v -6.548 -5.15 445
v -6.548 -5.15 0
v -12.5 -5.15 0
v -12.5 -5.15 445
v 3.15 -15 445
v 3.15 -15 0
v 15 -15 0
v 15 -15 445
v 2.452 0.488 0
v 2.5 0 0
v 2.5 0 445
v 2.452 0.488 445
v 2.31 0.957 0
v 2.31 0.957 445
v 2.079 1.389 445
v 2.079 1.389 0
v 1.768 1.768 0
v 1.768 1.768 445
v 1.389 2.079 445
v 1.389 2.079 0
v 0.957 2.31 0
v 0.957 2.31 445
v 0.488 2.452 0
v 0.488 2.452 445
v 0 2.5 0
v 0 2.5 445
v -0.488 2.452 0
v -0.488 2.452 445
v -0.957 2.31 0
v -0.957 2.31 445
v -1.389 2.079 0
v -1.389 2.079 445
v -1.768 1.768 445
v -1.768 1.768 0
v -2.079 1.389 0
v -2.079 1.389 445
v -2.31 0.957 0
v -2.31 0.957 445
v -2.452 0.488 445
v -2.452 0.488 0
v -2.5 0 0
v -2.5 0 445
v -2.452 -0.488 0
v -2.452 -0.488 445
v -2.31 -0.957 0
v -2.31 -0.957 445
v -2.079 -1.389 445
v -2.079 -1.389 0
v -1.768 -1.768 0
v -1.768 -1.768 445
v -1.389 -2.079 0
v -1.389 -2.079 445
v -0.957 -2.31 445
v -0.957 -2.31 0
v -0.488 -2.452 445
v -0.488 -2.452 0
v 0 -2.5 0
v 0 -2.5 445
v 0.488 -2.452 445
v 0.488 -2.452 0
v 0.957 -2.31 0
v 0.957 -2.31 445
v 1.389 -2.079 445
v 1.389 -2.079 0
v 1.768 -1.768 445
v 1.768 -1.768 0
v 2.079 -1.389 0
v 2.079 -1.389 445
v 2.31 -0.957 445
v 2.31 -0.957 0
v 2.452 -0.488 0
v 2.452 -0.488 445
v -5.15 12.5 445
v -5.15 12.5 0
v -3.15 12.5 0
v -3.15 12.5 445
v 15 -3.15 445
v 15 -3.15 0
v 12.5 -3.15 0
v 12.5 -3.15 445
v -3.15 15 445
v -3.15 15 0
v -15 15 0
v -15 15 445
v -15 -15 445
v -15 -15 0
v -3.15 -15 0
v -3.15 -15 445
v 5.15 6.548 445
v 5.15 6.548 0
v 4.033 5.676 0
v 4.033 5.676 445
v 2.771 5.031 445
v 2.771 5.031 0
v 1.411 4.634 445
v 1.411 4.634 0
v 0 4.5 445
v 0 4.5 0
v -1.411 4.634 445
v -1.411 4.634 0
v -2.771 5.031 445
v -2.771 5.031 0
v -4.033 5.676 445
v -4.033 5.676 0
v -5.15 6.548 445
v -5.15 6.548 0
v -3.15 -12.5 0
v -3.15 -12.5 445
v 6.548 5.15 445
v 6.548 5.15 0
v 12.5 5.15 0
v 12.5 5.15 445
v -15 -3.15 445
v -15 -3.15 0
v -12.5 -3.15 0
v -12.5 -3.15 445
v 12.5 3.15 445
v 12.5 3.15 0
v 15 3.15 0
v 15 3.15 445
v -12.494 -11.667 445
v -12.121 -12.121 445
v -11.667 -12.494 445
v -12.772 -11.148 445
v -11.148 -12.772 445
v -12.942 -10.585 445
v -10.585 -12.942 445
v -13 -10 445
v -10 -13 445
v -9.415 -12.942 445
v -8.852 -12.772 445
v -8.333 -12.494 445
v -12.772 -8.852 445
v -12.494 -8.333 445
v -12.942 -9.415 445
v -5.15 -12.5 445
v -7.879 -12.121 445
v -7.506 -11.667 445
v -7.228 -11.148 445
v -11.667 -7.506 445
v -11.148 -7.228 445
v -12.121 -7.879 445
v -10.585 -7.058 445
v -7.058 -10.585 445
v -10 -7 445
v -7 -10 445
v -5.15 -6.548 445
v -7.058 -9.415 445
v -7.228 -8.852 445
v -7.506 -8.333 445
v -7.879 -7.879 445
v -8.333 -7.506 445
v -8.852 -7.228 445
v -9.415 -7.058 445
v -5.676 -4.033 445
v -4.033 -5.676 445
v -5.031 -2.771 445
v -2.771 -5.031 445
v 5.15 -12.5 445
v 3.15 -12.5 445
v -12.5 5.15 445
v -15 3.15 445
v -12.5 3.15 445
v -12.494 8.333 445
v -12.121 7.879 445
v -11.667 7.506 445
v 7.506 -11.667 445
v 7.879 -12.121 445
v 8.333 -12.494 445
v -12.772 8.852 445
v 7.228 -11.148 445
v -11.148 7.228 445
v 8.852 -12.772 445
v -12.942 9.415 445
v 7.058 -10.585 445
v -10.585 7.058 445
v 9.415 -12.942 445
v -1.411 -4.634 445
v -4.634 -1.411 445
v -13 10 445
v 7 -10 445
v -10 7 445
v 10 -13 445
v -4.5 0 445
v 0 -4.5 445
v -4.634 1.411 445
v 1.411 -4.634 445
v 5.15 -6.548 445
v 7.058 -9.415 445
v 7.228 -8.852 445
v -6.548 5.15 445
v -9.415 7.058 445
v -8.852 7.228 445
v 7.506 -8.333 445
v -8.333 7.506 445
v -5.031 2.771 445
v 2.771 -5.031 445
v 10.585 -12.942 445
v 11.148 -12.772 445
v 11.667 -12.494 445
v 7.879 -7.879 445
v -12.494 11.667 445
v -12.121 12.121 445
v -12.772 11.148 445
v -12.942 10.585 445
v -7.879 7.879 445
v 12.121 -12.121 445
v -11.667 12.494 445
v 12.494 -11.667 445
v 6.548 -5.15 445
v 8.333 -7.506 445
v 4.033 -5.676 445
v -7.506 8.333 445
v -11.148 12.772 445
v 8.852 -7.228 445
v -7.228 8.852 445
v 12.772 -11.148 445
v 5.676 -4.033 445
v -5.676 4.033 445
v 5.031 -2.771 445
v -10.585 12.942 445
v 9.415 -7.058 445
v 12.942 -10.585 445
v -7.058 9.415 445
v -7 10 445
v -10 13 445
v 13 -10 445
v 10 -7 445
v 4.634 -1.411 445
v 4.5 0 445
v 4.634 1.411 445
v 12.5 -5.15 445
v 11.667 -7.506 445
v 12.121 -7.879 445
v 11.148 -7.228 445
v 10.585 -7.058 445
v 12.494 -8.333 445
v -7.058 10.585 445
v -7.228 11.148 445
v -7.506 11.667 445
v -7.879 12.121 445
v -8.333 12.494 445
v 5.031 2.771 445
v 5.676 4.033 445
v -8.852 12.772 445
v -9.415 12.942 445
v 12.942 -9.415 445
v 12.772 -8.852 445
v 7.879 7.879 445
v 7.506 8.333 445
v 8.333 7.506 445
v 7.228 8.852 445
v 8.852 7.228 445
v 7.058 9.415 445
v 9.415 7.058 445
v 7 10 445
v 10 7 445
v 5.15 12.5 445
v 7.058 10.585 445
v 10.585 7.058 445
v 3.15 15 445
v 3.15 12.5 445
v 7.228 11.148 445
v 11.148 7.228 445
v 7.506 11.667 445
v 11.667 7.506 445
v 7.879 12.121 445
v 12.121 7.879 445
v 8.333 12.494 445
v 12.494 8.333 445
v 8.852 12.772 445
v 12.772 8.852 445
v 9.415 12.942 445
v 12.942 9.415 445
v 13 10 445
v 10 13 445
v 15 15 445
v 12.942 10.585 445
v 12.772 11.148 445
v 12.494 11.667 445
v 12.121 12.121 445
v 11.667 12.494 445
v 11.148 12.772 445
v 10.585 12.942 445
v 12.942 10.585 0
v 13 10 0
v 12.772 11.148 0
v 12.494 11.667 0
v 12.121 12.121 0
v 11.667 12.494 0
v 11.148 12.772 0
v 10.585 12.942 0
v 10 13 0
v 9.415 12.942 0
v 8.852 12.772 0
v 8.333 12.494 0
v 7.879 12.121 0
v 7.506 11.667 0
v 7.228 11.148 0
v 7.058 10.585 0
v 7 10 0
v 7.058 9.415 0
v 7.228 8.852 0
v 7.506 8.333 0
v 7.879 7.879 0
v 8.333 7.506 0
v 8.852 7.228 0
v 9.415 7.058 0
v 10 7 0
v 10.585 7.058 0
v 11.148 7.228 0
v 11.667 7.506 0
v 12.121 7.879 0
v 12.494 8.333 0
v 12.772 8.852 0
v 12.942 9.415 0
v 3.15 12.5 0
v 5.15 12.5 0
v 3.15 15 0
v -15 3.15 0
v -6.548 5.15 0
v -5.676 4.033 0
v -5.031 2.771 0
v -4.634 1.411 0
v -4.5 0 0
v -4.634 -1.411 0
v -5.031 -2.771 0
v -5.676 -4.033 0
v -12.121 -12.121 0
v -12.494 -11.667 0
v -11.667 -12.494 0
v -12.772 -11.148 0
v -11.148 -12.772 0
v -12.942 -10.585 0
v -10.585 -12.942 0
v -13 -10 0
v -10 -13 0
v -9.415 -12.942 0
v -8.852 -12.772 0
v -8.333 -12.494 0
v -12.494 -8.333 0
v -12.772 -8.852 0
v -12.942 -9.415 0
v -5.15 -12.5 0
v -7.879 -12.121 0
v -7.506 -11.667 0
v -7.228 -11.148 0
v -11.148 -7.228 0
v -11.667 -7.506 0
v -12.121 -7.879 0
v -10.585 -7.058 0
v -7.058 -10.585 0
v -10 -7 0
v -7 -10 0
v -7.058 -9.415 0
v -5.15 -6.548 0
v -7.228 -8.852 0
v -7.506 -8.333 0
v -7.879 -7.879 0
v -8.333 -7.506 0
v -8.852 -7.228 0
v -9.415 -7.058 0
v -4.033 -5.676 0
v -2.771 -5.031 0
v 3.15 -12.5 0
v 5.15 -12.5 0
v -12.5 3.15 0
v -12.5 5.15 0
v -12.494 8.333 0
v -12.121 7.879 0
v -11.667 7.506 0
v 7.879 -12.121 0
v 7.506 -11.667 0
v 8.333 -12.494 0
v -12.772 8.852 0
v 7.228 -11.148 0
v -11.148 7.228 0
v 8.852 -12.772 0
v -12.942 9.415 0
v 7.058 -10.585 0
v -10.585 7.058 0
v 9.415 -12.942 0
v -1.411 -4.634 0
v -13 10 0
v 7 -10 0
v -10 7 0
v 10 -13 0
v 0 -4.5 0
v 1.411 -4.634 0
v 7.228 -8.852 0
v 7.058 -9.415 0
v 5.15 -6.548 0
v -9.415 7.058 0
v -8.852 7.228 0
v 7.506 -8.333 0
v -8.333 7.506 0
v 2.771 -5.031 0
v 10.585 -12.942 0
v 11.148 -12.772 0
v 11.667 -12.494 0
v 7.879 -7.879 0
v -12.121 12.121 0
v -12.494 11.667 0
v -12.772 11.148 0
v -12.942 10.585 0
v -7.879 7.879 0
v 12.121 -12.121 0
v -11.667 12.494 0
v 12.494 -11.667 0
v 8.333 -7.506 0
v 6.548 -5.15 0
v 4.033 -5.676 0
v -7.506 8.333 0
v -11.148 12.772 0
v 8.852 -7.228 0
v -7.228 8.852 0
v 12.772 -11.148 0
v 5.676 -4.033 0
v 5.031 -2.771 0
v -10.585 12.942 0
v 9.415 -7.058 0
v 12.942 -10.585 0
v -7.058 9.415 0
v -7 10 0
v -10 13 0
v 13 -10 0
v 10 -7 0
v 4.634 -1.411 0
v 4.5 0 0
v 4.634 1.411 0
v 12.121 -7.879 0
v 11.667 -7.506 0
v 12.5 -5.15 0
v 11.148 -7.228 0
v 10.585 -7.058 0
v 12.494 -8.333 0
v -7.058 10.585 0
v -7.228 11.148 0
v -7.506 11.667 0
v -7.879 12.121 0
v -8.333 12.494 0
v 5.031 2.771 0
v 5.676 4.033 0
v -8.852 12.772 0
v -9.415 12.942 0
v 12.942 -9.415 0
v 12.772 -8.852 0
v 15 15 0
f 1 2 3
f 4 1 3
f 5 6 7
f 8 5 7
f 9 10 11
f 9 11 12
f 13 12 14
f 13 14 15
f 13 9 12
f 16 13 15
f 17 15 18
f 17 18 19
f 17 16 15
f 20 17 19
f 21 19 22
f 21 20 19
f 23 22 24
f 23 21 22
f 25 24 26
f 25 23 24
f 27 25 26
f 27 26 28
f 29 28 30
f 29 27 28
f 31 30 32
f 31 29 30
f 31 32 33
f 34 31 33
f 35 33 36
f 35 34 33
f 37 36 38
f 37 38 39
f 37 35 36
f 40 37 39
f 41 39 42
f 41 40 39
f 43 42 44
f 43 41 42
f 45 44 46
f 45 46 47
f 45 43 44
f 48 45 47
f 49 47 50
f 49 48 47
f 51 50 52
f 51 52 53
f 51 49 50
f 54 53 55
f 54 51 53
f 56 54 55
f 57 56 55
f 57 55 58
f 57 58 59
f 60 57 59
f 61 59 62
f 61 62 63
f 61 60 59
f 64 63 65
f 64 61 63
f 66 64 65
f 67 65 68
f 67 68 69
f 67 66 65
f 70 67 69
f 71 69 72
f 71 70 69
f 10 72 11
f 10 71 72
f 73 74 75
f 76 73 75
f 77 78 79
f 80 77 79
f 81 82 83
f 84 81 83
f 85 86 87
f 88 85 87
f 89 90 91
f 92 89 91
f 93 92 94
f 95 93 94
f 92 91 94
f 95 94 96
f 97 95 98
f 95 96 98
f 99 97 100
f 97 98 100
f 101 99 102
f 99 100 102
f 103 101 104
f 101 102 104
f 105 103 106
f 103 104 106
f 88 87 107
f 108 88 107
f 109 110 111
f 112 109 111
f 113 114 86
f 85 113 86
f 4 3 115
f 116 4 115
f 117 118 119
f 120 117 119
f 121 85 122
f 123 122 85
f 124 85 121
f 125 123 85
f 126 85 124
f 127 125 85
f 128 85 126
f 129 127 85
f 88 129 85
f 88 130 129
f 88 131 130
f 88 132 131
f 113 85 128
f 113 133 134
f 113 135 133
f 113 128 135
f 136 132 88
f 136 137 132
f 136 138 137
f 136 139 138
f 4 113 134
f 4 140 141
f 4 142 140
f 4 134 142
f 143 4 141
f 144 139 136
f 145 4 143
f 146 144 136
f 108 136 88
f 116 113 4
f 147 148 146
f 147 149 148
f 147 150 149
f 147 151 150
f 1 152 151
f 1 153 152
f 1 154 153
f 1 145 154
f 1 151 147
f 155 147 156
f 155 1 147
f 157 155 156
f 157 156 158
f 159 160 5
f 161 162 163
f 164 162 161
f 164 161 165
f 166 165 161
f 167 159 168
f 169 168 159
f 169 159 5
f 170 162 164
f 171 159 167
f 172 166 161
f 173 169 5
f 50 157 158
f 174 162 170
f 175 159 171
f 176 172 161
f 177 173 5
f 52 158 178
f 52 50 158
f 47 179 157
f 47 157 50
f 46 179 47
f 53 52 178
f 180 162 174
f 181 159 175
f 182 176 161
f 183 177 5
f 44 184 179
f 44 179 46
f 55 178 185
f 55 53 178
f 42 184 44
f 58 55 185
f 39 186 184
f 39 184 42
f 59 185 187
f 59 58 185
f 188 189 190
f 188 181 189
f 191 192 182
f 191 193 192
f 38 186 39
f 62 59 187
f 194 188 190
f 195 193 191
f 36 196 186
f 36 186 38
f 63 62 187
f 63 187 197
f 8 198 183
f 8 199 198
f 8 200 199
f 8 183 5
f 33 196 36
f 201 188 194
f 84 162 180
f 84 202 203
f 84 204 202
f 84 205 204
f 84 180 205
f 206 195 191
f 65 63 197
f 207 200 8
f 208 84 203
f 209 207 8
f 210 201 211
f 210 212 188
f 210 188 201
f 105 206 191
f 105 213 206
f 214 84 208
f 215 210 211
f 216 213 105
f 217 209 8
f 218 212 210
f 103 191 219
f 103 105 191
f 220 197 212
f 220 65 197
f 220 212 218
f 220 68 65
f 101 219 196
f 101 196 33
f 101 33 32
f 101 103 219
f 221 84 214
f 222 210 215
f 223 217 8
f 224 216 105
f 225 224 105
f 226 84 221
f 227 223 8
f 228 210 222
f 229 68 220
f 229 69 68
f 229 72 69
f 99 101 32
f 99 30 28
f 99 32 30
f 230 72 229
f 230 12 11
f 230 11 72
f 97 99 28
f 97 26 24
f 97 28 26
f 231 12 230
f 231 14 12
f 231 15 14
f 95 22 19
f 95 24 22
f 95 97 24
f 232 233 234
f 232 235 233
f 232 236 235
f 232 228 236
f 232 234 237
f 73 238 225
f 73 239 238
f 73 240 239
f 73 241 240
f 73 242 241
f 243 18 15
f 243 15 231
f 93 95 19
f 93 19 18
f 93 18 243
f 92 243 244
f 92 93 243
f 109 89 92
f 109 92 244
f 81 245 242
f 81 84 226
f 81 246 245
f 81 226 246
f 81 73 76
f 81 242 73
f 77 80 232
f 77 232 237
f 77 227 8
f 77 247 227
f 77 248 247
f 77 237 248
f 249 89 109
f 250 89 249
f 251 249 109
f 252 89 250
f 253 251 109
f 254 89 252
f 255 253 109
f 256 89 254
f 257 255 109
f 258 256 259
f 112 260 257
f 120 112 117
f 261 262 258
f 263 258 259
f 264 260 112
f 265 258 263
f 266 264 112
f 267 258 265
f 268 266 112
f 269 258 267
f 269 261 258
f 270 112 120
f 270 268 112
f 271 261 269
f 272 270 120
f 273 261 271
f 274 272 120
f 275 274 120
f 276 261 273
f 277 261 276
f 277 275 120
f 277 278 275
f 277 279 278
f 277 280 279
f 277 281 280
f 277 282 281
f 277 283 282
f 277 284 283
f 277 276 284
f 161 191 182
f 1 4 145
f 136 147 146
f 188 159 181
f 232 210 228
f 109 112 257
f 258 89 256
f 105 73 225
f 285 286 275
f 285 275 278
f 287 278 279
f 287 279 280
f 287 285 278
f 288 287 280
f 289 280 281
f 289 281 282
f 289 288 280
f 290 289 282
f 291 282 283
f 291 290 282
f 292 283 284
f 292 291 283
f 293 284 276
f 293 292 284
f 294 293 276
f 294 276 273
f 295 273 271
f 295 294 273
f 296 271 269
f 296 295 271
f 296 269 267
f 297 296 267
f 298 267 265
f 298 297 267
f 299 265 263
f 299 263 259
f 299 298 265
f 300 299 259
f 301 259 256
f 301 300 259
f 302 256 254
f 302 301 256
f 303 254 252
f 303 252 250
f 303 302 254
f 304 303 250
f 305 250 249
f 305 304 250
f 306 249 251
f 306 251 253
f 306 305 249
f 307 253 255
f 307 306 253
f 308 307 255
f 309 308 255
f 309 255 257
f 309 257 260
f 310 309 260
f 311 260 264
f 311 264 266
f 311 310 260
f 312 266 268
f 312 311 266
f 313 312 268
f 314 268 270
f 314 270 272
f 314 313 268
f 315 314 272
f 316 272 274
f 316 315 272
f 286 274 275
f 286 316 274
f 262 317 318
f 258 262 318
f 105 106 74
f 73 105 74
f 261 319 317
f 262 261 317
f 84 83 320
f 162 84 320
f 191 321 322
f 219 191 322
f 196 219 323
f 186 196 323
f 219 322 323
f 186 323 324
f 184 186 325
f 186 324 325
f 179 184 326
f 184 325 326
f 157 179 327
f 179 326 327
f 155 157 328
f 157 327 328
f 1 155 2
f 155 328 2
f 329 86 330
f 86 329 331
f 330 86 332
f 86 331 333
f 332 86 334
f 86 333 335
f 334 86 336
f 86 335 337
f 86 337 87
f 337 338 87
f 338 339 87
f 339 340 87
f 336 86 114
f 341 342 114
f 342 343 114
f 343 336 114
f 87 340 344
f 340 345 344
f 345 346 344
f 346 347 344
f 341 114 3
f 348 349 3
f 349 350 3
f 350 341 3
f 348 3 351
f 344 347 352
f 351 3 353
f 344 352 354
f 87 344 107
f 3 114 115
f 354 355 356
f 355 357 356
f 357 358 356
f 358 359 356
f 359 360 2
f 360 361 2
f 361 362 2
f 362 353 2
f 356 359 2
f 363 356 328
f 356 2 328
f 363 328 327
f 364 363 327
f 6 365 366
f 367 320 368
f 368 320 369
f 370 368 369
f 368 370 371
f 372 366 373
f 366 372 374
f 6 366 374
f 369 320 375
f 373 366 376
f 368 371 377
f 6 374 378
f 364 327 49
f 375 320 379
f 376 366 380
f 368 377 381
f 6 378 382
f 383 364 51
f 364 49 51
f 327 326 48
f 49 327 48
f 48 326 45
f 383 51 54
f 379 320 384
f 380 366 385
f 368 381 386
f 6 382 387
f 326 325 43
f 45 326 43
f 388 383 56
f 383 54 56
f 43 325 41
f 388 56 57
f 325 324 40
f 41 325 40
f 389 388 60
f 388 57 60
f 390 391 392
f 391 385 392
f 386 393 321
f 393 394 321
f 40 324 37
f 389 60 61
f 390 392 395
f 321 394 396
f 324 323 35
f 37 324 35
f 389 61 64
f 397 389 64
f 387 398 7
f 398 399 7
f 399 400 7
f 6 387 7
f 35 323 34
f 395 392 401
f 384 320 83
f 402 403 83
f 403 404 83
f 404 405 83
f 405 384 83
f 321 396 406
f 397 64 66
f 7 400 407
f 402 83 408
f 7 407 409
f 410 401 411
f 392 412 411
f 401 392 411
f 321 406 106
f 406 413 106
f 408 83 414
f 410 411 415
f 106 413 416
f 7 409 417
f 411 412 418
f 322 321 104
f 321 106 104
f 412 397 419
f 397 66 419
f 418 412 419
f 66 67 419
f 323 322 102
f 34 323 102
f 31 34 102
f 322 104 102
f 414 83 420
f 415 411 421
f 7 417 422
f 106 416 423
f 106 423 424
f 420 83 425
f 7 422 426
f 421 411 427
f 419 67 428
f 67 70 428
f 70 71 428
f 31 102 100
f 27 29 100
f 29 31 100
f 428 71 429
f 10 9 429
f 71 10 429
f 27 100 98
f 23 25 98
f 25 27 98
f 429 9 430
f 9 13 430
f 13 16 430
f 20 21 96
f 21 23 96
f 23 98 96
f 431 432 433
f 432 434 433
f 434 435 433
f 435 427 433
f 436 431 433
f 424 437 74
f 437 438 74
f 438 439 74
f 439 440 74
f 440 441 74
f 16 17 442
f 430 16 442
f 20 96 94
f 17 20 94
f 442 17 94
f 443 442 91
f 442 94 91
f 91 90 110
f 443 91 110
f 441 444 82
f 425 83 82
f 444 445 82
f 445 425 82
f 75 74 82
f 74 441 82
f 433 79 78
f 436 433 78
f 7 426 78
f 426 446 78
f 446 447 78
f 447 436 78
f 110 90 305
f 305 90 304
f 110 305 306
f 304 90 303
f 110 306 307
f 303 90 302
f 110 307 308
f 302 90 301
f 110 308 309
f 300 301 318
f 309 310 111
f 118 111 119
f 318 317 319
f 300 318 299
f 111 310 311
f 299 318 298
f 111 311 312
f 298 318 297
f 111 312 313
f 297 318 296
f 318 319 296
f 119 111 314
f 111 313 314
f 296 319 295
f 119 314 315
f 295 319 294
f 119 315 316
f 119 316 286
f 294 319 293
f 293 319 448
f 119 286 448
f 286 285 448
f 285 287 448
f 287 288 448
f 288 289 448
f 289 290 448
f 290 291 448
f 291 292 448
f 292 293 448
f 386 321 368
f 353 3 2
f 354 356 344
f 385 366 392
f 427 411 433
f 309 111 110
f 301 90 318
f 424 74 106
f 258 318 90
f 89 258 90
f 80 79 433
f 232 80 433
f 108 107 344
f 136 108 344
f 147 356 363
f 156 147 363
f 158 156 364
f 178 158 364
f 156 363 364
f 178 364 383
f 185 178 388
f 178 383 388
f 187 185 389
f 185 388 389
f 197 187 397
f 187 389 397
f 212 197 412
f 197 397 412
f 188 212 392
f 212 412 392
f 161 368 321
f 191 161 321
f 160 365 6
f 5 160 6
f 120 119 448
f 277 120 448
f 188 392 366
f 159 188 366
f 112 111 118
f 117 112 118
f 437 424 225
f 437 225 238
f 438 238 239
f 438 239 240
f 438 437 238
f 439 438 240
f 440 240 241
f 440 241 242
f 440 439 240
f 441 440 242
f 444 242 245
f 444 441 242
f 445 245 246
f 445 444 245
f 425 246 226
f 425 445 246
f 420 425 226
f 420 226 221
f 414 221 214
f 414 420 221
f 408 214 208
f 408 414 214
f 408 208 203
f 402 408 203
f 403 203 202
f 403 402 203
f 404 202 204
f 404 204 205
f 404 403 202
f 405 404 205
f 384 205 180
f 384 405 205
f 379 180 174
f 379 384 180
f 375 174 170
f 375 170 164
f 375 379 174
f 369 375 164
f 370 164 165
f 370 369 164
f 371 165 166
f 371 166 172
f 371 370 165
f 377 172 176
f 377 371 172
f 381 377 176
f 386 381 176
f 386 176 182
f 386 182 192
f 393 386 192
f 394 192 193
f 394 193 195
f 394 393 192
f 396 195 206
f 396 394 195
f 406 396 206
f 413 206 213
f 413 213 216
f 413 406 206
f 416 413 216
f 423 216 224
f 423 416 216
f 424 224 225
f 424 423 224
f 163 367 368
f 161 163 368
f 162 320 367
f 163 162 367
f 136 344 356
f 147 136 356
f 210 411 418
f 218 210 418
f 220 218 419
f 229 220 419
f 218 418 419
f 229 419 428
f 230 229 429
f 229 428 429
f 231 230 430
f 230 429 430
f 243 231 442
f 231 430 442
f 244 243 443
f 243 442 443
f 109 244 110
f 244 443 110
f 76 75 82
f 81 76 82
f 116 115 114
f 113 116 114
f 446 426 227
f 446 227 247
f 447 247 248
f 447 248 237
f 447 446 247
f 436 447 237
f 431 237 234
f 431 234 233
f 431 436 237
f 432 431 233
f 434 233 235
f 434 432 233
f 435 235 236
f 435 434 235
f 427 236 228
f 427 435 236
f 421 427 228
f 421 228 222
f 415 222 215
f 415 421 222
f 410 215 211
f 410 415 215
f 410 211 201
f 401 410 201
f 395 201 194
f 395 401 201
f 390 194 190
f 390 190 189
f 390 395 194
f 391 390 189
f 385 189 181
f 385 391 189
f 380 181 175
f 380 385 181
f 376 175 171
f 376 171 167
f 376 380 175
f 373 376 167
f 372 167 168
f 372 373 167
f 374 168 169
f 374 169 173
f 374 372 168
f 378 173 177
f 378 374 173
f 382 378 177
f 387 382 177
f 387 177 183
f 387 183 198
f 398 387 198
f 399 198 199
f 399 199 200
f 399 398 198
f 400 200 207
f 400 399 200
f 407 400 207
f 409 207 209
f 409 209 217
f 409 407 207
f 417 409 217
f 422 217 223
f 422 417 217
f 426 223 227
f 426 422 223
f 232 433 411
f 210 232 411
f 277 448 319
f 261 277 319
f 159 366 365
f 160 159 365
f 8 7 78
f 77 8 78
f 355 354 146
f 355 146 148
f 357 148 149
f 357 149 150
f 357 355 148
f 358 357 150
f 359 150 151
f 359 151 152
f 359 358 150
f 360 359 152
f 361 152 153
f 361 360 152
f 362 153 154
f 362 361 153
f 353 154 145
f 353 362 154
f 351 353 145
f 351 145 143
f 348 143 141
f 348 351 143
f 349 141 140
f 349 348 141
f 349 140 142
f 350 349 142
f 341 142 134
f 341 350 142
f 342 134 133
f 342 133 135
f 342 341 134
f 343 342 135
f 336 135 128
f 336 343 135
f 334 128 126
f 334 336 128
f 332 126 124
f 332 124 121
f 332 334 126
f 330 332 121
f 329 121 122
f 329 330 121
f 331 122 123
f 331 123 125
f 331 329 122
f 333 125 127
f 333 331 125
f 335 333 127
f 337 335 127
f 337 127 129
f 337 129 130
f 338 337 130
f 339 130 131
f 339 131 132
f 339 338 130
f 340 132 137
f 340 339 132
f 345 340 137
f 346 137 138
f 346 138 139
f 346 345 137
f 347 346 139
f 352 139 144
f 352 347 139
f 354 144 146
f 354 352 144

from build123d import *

# Parameters (mm, degrees)
F0_R     = 3
F0_R_2   = 2.5
F1_DEPTH = 445


with BuildPart() as f1:
    # F0 (on Top) → F1 (new body)
    with BuildSketch(Plane.XY):
        with BuildLine():
            Line((-15, 15), (-15, 3.15))
            Line((-15, 3.15), (-12.5, 3.15))
            Line((-12.5, 3.15), (-12.5, 5.15))
            Line((-12.5, 5.15), (-6.547707, 5.15))
            ThreePointArc((-6.547707, 5.15), (-4.5, 0), (-6.547707, -5.15))
            Line((-6.547707, -5.15), (-12.5, -5.15))
            Line((-12.5, -5.15), (-12.5, -3.15))
            Line((-12.5, -3.15), (-15, -3.15))
            Line((-15, -3.15), (-15, -15))
            Line((-15, -15), (-3.15, -15))
            Line((-3.15, -15), (-3.15, -12.5))
            Line((-3.15, -12.5), (-5.15, -12.5))
            Line((-5.15, -12.5), (-5.15, -6.547707))
            ThreePointArc((-5.15, -6.547707), (0, -4.5), (5.15, -6.547707))
            Line((5.15, -6.547707), (5.15, -12.5))
            Line((5.15, -12.5), (3.15, -12.5))
            Line((3.15, -12.5), (3.15, -15))
            Line((3.15, -15), (15, -15))
            Line((15, -15), (15, -3.15))
            Line((15, -3.15), (12.5, -3.15))
            Line((12.5, -3.15), (12.5, -5.15))
            Line((12.5, -5.15), (6.547707, -5.15))
            ThreePointArc((6.547707, -5.15), (4.5, 0), (6.547707, 5.15))
            Line((6.547707, 5.15), (12.5, 5.15))
            Line((12.5, 5.15), (12.5, 3.15))
            Line((12.5, 3.15), (15, 3.15))
            Line((15, 3.15), (15, 15))
            Line((15, 15), (3.15, 15))
            Line((3.15, 15), (3.15, 12.5))
            Line((3.15, 12.5), (5.15, 12.5))
            Line((5.15, 12.5), (5.15, 6.547707))
            ThreePointArc((5.15, 6.547707), (0, 4.5), (-5.15, 6.547707))
            Line((-5.15, 6.547707), (-5.15, 12.5))
            Line((-5.15, 12.5), (-3.15, 12.5))
            Line((-3.15, 12.5), (-3.15, 15))
            Line((-3.15, 15), (-15, 15))
        make_face()
        with Locations((-10, -10)):
            Circle(F0_R, mode=Mode.SUBTRACT)
        with Locations((10, -10)):
            Circle(F0_R, mode=Mode.SUBTRACT)
        with Locations((-10, 10)):
            Circle(F0_R, mode=Mode.SUBTRACT)
        Circle(F0_R_2, mode=Mode.SUBTRACT)
        with Locations((10, 10)):
            Circle(F0_R, mode=Mode.SUBTRACT)
    extrude(amount=F1_DEPTH)


solid = f1.part
